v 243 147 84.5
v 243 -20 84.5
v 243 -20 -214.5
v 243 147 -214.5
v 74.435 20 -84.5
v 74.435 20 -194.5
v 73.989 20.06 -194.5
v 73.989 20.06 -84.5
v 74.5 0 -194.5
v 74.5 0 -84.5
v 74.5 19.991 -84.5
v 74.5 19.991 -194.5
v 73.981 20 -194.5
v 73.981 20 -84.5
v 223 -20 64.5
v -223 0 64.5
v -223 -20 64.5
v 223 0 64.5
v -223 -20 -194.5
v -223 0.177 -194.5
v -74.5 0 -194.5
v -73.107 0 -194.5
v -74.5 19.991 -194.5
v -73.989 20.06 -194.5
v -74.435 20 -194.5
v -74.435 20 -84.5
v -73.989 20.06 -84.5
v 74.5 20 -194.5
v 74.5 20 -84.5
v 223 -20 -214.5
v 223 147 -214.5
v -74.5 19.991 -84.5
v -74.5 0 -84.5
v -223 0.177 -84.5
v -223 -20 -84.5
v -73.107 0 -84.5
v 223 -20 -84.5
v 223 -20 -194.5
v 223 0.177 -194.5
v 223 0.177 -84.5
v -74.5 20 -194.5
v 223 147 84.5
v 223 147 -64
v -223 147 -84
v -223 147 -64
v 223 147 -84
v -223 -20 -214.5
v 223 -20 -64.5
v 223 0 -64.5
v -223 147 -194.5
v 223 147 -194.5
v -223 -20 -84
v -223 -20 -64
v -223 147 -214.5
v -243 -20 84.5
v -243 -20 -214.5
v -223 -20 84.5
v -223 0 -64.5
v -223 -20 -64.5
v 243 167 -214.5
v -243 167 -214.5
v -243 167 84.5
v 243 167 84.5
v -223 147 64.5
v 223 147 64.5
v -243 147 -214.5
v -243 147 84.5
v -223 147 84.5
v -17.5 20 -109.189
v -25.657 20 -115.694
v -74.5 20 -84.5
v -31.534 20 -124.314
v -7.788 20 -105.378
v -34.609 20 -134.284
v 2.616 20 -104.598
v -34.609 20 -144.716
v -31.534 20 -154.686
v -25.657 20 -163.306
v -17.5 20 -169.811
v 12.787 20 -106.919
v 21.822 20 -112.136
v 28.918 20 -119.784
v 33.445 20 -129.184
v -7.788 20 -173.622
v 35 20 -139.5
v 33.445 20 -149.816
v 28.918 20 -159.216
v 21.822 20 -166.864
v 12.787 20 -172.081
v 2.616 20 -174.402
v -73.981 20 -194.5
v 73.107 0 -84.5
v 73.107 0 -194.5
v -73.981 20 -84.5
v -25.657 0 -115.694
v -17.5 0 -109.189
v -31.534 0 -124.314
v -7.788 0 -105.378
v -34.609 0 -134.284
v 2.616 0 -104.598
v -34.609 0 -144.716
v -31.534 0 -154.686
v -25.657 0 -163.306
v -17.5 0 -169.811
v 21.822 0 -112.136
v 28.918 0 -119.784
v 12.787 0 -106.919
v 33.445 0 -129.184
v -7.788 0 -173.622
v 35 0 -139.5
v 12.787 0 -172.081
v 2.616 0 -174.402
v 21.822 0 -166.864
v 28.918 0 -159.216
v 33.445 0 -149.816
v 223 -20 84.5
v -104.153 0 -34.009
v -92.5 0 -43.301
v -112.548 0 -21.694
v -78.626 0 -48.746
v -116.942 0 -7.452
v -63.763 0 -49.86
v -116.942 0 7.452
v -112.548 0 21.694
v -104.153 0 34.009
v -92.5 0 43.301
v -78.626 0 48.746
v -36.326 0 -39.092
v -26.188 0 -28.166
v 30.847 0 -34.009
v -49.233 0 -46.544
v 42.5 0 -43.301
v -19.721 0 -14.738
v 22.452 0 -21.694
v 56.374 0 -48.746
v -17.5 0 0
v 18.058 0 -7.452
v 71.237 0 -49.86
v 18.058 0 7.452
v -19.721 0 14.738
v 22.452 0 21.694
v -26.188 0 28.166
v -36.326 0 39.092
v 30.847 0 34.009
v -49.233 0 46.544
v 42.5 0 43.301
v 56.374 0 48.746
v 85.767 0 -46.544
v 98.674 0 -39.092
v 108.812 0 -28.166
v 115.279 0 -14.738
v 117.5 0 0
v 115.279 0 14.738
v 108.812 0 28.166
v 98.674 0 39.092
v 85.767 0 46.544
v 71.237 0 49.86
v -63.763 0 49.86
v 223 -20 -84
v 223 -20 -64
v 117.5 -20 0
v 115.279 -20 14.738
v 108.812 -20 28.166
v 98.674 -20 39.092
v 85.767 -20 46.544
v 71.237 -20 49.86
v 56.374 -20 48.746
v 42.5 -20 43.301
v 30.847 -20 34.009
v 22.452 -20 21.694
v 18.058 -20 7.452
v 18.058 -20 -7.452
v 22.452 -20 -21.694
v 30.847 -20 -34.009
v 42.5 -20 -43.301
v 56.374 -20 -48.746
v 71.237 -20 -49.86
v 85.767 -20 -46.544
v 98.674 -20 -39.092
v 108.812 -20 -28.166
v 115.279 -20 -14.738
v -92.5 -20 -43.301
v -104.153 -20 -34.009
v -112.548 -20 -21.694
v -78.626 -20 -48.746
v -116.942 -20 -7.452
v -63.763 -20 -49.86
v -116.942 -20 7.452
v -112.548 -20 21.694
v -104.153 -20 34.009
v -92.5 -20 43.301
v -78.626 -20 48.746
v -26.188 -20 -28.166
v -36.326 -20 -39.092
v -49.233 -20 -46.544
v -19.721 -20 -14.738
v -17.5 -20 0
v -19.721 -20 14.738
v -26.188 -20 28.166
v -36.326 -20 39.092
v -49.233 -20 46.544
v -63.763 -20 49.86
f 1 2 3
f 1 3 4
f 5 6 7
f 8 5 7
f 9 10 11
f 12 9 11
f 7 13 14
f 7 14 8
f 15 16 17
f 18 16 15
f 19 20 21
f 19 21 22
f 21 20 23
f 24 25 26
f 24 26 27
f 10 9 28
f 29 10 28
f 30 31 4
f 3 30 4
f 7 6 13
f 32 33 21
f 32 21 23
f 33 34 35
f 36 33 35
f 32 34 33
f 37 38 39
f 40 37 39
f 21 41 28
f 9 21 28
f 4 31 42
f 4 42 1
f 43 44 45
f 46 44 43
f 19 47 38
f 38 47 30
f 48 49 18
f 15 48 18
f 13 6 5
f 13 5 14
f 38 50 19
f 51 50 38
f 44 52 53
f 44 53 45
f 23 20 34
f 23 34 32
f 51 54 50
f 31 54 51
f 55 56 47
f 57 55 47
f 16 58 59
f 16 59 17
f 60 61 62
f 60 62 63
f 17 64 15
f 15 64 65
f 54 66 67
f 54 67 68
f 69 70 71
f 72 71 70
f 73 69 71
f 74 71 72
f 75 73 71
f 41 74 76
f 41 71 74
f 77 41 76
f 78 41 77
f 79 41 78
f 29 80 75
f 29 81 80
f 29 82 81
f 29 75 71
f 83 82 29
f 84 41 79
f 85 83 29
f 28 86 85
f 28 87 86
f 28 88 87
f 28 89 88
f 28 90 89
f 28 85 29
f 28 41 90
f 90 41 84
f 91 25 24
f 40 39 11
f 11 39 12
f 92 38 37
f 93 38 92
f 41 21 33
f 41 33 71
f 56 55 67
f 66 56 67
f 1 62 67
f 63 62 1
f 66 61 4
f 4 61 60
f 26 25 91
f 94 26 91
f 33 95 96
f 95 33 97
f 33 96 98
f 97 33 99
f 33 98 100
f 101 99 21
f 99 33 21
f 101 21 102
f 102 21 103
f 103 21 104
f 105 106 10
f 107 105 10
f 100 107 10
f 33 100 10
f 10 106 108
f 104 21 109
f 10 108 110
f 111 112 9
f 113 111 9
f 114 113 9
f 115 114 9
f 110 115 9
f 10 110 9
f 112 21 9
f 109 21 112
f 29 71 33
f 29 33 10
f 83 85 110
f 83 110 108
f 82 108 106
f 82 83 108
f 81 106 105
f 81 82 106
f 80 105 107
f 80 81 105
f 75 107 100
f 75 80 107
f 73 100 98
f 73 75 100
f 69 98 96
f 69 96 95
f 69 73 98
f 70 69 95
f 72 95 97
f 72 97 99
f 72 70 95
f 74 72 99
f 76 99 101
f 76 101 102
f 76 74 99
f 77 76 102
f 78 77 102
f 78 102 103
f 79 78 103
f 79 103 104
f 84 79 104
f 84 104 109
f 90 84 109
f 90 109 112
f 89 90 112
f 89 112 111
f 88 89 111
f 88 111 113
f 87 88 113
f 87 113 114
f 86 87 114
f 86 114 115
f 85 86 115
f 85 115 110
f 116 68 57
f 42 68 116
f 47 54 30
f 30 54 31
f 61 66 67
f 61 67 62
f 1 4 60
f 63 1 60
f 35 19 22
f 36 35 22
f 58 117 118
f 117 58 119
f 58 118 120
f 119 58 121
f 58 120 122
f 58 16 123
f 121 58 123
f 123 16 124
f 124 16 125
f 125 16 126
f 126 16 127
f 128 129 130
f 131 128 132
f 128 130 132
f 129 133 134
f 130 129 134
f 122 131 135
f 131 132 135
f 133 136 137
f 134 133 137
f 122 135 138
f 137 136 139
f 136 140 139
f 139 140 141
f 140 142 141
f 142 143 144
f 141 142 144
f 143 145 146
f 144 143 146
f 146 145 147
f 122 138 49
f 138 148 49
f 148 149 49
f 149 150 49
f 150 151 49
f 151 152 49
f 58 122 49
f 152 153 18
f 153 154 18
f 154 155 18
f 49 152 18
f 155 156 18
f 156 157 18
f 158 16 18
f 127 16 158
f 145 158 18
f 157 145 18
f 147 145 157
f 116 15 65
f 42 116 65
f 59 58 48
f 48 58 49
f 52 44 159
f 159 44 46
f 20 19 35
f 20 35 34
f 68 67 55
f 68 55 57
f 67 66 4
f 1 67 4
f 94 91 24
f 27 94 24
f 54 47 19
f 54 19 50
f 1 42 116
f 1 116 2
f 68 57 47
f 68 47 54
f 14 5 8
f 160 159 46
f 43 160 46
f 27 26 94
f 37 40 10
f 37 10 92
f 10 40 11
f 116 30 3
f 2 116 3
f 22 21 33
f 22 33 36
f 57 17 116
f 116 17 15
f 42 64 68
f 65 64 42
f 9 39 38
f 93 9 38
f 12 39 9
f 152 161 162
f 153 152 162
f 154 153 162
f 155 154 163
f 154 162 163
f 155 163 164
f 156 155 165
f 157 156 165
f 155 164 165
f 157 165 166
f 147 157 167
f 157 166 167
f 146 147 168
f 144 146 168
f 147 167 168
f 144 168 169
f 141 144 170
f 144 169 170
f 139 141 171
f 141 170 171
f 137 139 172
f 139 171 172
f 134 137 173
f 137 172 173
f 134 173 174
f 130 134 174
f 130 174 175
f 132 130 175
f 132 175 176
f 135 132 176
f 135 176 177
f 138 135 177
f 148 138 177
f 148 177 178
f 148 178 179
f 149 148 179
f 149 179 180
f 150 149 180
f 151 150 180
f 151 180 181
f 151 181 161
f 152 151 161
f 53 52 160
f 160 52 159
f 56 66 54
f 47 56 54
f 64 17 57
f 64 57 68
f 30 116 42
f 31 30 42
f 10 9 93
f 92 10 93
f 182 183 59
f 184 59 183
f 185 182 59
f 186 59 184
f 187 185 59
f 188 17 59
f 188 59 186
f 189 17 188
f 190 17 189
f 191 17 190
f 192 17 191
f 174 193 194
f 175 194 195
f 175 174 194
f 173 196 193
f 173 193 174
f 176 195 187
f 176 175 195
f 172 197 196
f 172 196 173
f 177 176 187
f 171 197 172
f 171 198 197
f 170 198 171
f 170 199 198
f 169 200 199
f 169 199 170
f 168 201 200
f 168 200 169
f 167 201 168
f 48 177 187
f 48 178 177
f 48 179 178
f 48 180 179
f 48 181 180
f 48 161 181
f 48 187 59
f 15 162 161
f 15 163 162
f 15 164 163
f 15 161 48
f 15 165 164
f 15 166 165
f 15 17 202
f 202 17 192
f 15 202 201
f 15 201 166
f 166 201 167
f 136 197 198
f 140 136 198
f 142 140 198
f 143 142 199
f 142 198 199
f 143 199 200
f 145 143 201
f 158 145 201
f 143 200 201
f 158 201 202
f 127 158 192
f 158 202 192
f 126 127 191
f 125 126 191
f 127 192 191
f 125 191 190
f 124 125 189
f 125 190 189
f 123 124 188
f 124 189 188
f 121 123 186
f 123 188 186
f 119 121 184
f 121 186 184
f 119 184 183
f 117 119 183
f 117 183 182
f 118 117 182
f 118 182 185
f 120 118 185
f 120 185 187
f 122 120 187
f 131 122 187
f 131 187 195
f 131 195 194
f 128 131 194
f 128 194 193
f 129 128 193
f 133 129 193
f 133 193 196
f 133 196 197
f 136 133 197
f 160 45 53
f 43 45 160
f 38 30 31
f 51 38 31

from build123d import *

# Parameters (mm, degrees)
SKETCH_W               = 446
SKETCH_H               = 129
PAD_DEPTH              = 20
SKETCH001_R            = 50
POCKET_DEPTH           = 20.001
BOX_W                  = 20
BOX_H                  = 167
BOX_DEPTH              = 299
BOX001_W               = 20
BOX001_H               = 167
BOX001_DEPTH           = 299
BOX002_W               = 446
BOX002_H               = 167
BOX002_DEPTH           = 20
BOX003_W               = 486
BOX003_H               = 20
BOX003_DEPTH           = 299
BOX004_W               = 446
BOX004_H               = 167
BOX004_DEPTH           = 20
BOX006_W               = 446
BOX006_H               = 167
BOX006_DEPTH           = 20
CYLINDER_R             = 35
CYLINDER_DEPTH         = 115
CYLINDER_ROLL_ANGLE    = 90
BOX005_W               = 149
BOX005_H               = 20
BOX005_DEPTH           = 110
BOX008_W               = 10
BOX008_H               = 20
BOX008_DEPTH           = 110
BOX009_W               = 20
BOX009_H               = 21
BOX009_DEPTH           = 110
BOX007_W               = 153
BOX007_H               = 20
BOX007_DEPTH           = 110
BOX007_PLACEMENT_ANGLE = 7.6
BOX012_W               = 10
BOX012_H               = 20
BOX012_DEPTH           = 110
BOX011_W               = 20
BOX011_H               = 21
BOX011_DEPTH           = 110
BOX010_W               = 153
BOX010_H               = 20
BOX010_DEPTH           = 110
BOX010_PLACEMENT_ANGLE = 7.6


with BuildPart() as face_avant_sup:
    # Sketch → Pad (new body)
    with BuildSketch(Plane.XZ):
        Rectangle(SKETCH_W, SKETCH_H)
    extrude(amount=PAD_DEPTH)

    # Sketch001 (on Face6 of Pad) → Pocket (cut, through all)
    with BuildSketch(Plane.XZ.offset(20)):
        with Locations((-67.5, 0)):
            Circle(SKETCH001_R)
        with Locations((67.5, 0)):
            Circle(SKETCH001_R)
    extrude(amount=-POCKET_DEPTH, mode=Mode.SUBTRACT)


with BuildPart() as face_gauche:
    # Box → Box (new body)
    with BuildSketch(Plane(origin=(-243, -20, -214.5), x_dir=(1, 0, 0), z_dir=(0, 0, 1))):
        with Locations((10, 83.5)):
            Rectangle(BOX_W, BOX_H)
    extrude(amount=BOX_DEPTH)


with BuildPart() as face_droite:
    # Box001 → Box001 (new body)
    with BuildSketch(Plane(origin=(223, -20, -214.5), x_dir=(1, 0, 0), z_dir=(0, 0, 1))):
        with Locations((10, 83.5)):
            Rectangle(BOX001_W, BOX001_H)
    extrude(amount=BOX001_DEPTH)


with BuildPart() as face_haute:
    # Box002 → Box002 (new body)
    with BuildSketch(Plane(origin=(-223, -20, 64.5), x_dir=(1, 0, 0), z_dir=(0, 0, 1))):
        with Locations((223, 83.5)):
            Rectangle(BOX002_W, BOX002_H)
    extrude(amount=BOX002_DEPTH)


with BuildPart() as face_fond:
    # Box003 → Box003 (new body)
    with BuildSketch(Plane(origin=(-243, 147, -214.5), x_dir=(1, 0, 0), z_dir=(0, 0, 1))):
        with Locations((243, 10)):
            Rectangle(BOX003_W, BOX003_H)
    extrude(amount=BOX003_DEPTH)


with BuildPart() as face_basse:
    # Box004 → Box004 (new body)
    with BuildSketch(Plane(origin=(-223, -20, -214.5), x_dir=(1, 0, 0), z_dir=(0, 0, 1))):
        with Locations((223, 83.5)):
            Rectangle(BOX004_W, BOX004_H)
    extrude(amount=BOX004_DEPTH)


with BuildPart() as face_interm_diaire:
    # Box006 → Box006 (new body)
    with BuildSketch(Plane(origin=(-223, -20, -84), x_dir=(1, 0, 0), z_dir=(0, 0, 1))):
        with Locations((223, 83.5)):
            Rectangle(BOX006_W, BOX006_H)
    extrude(amount=BOX006_DEPTH)


with BuildPart() as bass_reflex:
    # Cylinder → Cylinder (new body)
    with BuildSketch(Plane.XY):
        Circle(CYLINDER_R)
    extrude(amount=CYLINDER_DEPTH)


with BuildPart() as bass_reflex_1:
    # Cylinder roll: moved
    add(bass_reflex.part.rotate(Axis((0, 0, 0), (1, 0, 0)), CYLINDER_ROLL_ANGLE))


with BuildPart() as bass_reflex_2:
    # Cylinder placement: moved
    add(bass_reflex_1.part.moved(Location((0, 115, -139.5))))


with BuildPart() as avant_bass_reflex:
    # Box005 → Box005 (new body)
    with BuildSketch(Plane(origin=(-74.5, 0, -194.5), x_dir=(1, 0, 0), z_dir=(0, 0, 1))):
        with Locations((74.5, 10)):
            Rectangle(BOX005_W, BOX005_H)
    extrude(amount=BOX005_DEPTH)

    # Cut: cut Bass Reflex
    add(bass_reflex_2.part, mode=Mode.SUBTRACT)


with BuildPart() as coupe1:
    # Box008 → Box008 (new body)
    with BuildSketch(Plane(origin=(-74.5, 0, -194.5), x_dir=(1, 0, 0), z_dir=(0, 0, 1))):
        with Locations((5, 10)):
            Rectangle(BOX008_W, BOX008_H)
    extrude(amount=BOX008_DEPTH)


with BuildPart() as coupe2:
    # Box009 → Box009 (new body)
    with BuildSketch(Plane(origin=(-243, -20, -194.5), x_dir=(1, 0, 0), z_dir=(0, 0, 1))):
        with Locations((10, 10.5)):
            Rectangle(BOX009_W, BOX009_H)
    extrude(amount=BOX009_DEPTH)


with BuildPart() as coupe_avant_gauche:
    # Box007 → Box007 (new body)
    with BuildSketch(Plane.XY):
        with Locations((76.5, 10)):
            Rectangle(BOX007_W, BOX007_H)
    extrude(amount=BOX007_DEPTH)


with BuildPart() as coupe_avant_gauche_1:
    # Box007 placement: moved
    add(coupe_avant_gauche.part.moved(Location((-223, -20, -194.5))).rotate(Axis((-223, -20, -194.5), (0, 0, 1)), BOX007_PLACEMENT_ANGLE))

    # Cut001: cut Coupe2
    add(coupe2.part, mode=Mode.SUBTRACT)

    # Cut002: cut Coupe1
    add(coupe1.part, mode=Mode.SUBTRACT)


with BuildPart() as coupe004:
    # Box012 → Box012 (new body)
    with BuildSketch(Plane(origin=(-74.5, 0, -194.5), x_dir=(1, 0, 0), z_dir=(0, 0, 1))):
        with Locations((5, 10)):
            Rectangle(BOX012_W, BOX012_H)
    extrude(amount=BOX012_DEPTH)


with BuildPart() as coupe003:
    # Box011 → Box011 (new body)
    with BuildSketch(Plane(origin=(-243, -20, -194.5), x_dir=(1, 0, 0), z_dir=(0, 0, 1))):
        with Locations((10, 10.5)):
            Rectangle(BOX011_W, BOX011_H)
    extrude(amount=BOX011_DEPTH)


with BuildPart() as coupe_avant_droit:
    # Box010 → Box010 (new body)
    with BuildSketch(Plane.XY):
        with Locations((76.5, 10)):
            Rectangle(BOX010_W, BOX010_H)
    extrude(amount=BOX010_DEPTH)


with BuildPart() as coupe_avant_droit_1:
    # Box010 placement: moved
    add(coupe_avant_droit.part.moved(Location((-223, -20, -194.5))).rotate(Axis((-223, -20, -194.5), (0, 0, 1)), BOX010_PLACEMENT_ANGLE))

    # Cut004: cut Coupe003
    add(coupe003.part, mode=Mode.SUBTRACT)

    # Cut003: cut Coupe004
    add(coupe004.part, mode=Mode.SUBTRACT)


with BuildPart() as coupe_avant_droit001:
    # Part__Mirroring: instance of Coupe avant droit
    add(coupe_avant_droit_1.part.mirror(Plane(origin=(0, 0, 0), x_dir=(0, -1, 0), z_dir=(1, 0, 0))))


solid = Compound([face_avant_sup.part, face_gauche.part, face_droite.part, face_haute.part, face_fond.part, face_basse.part, face_interm_diaire.part, avant_bass_reflex.part, coupe_avant_gauche_1.part, coupe_avant_droit001.part])
